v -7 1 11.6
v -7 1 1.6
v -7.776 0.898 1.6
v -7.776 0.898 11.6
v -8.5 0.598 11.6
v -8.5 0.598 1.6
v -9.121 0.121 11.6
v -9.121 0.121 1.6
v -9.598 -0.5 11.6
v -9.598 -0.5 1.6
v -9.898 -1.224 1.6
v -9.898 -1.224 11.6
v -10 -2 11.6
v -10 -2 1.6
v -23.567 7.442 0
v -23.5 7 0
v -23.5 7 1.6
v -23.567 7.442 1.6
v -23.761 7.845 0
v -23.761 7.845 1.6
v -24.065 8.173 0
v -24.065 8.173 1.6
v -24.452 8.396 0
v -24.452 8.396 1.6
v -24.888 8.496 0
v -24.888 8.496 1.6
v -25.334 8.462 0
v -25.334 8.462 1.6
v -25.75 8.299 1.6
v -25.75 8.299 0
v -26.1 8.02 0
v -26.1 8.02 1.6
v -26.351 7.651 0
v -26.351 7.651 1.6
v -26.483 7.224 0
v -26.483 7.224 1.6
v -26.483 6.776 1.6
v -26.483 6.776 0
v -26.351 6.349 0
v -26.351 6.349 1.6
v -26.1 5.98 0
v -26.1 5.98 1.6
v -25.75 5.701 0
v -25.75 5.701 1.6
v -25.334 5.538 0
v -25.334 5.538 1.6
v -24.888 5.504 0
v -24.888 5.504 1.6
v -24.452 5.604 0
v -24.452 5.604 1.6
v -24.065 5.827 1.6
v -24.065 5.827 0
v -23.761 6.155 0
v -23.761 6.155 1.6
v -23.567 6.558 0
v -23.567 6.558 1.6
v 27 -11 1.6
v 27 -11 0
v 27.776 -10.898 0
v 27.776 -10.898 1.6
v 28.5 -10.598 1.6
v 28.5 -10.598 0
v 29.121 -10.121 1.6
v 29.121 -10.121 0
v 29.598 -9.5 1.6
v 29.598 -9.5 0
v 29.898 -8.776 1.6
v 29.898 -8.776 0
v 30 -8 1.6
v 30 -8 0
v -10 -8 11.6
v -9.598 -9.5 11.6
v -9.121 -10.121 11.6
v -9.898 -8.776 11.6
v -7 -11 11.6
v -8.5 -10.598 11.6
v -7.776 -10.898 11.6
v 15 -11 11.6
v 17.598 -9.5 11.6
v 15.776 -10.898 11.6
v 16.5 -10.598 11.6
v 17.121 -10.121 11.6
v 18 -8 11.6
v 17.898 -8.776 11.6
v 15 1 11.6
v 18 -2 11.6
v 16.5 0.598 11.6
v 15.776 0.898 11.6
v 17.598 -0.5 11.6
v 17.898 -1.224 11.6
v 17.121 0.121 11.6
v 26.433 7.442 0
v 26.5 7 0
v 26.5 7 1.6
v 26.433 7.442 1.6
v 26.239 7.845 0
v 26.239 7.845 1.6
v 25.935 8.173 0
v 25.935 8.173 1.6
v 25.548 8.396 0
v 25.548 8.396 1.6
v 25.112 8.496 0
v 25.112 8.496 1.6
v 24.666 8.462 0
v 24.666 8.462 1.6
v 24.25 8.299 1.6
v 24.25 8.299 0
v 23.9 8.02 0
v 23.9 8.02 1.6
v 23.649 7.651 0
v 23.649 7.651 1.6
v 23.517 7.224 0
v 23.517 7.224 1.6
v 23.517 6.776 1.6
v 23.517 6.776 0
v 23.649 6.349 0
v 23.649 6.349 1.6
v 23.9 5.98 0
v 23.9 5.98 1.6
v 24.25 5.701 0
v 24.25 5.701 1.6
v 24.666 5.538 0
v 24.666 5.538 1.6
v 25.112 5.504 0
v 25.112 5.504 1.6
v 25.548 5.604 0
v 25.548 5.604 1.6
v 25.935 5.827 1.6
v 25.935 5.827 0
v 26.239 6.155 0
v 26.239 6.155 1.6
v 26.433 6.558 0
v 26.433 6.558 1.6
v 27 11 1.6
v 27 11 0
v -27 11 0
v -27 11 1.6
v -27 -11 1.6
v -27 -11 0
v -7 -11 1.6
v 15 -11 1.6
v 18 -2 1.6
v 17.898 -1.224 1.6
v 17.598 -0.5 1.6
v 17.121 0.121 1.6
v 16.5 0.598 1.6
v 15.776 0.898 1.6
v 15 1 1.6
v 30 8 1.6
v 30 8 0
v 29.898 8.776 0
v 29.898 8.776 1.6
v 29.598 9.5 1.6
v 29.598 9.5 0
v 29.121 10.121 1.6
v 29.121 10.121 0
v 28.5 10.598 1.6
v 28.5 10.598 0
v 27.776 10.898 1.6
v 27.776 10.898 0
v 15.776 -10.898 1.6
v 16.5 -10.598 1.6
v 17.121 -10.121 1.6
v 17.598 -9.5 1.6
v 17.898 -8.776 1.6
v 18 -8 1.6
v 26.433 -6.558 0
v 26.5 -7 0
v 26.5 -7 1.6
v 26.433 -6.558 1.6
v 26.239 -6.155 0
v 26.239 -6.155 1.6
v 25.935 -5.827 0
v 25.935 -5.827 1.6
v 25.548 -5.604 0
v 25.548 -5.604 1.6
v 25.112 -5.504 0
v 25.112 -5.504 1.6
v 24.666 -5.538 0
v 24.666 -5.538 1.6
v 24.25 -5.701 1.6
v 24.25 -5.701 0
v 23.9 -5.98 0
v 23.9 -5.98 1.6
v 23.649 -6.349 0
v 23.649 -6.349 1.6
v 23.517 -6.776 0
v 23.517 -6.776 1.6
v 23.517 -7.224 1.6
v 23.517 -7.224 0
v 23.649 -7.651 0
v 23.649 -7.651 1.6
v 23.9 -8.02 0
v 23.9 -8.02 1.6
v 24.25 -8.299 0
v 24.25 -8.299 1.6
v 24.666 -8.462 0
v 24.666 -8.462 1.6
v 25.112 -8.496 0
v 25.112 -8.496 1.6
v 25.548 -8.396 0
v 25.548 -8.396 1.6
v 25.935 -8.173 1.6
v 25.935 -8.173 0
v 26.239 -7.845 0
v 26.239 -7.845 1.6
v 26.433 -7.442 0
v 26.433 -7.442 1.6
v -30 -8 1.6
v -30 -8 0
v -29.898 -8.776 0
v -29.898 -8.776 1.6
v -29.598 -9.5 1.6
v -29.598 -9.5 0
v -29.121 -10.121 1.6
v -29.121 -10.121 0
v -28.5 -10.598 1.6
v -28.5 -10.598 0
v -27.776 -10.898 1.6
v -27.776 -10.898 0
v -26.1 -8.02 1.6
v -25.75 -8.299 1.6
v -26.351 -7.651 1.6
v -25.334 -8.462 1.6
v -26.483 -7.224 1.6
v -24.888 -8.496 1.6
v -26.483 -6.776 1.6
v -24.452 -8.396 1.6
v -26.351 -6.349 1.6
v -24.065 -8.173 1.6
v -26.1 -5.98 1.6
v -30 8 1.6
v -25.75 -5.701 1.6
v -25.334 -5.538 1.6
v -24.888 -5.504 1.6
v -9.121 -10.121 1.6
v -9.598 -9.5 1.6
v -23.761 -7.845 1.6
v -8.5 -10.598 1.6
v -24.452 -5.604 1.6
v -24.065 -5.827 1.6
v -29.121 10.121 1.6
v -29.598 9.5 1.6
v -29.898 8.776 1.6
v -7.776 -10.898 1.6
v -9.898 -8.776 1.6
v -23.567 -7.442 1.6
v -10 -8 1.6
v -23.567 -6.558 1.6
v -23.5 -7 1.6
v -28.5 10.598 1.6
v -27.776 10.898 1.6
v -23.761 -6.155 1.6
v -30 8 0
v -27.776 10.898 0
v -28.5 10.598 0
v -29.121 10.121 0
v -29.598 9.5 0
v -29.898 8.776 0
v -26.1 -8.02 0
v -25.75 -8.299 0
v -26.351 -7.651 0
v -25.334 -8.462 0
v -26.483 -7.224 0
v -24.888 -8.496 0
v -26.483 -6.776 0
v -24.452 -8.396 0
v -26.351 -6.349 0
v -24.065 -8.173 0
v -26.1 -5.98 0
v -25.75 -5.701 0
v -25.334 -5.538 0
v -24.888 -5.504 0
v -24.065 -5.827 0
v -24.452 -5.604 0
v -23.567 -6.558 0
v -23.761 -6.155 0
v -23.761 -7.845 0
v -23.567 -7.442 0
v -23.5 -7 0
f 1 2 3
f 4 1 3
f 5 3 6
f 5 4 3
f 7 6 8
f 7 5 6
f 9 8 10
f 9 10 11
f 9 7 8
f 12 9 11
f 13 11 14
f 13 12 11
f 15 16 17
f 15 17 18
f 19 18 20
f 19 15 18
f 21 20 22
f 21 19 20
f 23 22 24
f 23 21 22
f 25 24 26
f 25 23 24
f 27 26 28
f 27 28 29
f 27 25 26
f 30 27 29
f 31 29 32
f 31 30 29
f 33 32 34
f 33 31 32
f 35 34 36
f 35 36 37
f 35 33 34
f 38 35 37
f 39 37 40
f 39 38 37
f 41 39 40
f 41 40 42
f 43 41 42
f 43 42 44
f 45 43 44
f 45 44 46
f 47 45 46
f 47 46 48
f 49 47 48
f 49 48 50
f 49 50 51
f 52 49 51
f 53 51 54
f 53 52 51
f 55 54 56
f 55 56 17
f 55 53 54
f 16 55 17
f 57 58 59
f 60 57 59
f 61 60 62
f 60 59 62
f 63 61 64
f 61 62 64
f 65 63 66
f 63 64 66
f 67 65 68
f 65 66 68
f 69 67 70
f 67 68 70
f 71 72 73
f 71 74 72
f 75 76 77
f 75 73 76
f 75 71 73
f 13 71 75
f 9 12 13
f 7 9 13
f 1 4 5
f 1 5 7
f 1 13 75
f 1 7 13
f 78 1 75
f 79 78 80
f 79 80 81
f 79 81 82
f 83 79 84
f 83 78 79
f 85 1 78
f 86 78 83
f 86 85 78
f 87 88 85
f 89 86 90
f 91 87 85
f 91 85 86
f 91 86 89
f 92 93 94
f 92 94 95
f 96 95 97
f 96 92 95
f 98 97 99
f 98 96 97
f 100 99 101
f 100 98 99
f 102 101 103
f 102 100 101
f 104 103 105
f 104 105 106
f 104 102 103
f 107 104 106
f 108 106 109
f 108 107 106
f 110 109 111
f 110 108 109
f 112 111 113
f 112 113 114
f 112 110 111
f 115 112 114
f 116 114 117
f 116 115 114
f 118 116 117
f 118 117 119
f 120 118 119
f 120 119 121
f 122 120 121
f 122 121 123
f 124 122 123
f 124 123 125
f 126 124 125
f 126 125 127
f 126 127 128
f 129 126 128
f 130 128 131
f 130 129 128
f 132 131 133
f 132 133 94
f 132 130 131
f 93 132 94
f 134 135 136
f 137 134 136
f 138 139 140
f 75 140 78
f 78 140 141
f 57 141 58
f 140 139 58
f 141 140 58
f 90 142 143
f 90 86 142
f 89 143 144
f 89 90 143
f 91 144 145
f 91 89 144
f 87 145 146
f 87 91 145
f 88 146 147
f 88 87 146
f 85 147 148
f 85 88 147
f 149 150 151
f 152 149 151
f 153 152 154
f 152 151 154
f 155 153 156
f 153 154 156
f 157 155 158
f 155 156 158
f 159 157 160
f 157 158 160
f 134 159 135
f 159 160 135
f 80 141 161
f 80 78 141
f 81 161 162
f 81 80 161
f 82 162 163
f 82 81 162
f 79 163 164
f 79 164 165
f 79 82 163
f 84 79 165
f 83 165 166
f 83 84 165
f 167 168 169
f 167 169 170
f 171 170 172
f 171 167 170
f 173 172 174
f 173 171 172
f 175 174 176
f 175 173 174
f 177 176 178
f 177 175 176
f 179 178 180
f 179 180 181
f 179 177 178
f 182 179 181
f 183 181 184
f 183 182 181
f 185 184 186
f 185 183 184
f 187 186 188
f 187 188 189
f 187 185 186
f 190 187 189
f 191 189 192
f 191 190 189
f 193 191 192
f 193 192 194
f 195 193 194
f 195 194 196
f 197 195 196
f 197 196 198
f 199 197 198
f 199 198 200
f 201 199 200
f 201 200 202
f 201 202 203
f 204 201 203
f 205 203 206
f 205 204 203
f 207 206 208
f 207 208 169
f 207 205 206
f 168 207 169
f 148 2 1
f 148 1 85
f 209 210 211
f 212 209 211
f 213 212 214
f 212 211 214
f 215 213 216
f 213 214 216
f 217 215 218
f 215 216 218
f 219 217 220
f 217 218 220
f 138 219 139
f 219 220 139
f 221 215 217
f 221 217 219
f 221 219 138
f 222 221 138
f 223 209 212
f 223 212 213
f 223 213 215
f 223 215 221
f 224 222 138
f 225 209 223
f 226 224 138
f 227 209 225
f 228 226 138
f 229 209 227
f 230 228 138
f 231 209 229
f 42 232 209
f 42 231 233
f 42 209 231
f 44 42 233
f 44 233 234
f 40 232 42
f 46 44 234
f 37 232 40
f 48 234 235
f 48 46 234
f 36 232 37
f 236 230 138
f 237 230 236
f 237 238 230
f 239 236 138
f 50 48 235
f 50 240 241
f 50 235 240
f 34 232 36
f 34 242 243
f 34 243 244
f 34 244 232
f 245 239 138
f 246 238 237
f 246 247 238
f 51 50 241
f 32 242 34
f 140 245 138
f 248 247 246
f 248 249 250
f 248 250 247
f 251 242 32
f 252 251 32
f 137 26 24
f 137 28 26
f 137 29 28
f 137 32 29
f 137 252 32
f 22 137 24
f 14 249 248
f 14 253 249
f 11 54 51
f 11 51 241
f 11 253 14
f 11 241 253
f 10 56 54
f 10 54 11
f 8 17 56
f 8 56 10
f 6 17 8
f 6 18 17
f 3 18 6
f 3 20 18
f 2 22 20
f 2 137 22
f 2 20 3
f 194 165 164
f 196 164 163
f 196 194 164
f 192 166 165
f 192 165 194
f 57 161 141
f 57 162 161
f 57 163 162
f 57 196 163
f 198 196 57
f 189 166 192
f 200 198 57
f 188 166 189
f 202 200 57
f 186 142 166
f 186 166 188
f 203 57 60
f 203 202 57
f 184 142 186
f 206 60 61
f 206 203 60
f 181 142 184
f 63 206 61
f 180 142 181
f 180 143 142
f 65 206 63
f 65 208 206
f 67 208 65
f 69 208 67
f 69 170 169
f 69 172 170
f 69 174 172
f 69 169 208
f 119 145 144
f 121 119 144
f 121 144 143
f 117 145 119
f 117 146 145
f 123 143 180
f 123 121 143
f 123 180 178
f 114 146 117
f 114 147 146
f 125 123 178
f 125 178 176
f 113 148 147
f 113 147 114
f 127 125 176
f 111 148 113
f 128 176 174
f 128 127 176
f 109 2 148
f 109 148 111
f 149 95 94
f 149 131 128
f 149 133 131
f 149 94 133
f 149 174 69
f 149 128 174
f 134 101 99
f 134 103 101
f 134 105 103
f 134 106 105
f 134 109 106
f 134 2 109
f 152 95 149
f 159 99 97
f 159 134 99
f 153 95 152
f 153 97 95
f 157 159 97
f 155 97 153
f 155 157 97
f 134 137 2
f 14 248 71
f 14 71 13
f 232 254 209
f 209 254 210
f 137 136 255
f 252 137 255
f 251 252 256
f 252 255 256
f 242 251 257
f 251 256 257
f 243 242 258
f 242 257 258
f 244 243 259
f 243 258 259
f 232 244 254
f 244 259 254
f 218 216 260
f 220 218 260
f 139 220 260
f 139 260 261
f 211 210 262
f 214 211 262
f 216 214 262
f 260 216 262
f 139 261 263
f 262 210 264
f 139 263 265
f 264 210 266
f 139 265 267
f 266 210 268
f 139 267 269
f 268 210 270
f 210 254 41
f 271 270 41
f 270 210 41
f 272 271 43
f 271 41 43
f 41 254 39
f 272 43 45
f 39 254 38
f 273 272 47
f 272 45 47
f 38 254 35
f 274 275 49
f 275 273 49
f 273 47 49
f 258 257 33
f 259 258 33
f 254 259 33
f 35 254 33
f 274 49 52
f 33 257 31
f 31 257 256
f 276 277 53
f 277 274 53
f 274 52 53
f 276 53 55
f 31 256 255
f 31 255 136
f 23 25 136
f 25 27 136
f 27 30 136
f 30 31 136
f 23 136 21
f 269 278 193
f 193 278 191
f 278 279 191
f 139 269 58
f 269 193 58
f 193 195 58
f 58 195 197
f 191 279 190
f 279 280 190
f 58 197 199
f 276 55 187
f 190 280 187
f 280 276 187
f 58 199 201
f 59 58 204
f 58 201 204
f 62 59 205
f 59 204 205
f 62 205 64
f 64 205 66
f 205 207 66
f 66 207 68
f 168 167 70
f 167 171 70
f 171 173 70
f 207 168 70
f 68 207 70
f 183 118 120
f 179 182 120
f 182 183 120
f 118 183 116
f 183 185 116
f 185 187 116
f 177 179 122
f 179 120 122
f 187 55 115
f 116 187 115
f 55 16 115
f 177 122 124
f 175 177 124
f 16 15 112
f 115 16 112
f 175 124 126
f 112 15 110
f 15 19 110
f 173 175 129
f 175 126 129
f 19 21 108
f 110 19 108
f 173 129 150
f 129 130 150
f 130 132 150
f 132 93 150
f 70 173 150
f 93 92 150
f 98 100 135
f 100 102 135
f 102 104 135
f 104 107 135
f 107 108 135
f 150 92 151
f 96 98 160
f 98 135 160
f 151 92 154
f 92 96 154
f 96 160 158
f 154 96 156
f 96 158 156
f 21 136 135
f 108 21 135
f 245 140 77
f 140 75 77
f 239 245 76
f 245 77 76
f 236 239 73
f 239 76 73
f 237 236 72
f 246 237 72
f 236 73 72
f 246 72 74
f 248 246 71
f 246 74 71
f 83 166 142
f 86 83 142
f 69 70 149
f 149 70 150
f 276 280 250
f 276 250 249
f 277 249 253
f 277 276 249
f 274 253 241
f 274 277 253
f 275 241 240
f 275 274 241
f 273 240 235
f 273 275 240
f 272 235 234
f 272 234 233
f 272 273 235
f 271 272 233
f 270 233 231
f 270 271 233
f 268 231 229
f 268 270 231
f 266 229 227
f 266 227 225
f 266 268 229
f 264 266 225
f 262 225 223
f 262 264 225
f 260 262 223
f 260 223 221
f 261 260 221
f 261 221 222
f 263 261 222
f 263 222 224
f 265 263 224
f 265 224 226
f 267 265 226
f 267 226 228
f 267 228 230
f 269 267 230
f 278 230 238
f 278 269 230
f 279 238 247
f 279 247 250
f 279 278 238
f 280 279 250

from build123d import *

# Parameters (mm, degrees)
SKETCH_1_R      = 1.5
EXTRUDE_1_DEPTH = 1.6
SKETCH_2_W      = 28
SKETCH_2_H      = 12
EXTRUDE_2_DEPTH = 10
FILLET_1_R      = 3


with BuildPart() as part:
    # 草图1 → 凸台-拉伸1 (new body)
    with BuildSketch(Plane.XY):
        with BuildLine():
            Line((-30, 8), (-30, -8))
            ThreePointArc((-30, -8), (-29.121320344, -10.121320344), (-27, -11))
            Line((-27, -11), (27, -11))
            ThreePointArc((27, -11), (29.121320344, -10.121320344), (30, -8))
            Line((30, -8), (30, 8))
            ThreePointArc((30, 8), (29.121320344, 10.121320344), (27, 11))
            Line((27, 11), (-27, 11))
            ThreePointArc((-27, 11), (-29.121320344, 10.121320344), (-30, 8))
        make_face()
        with Locations((-25, 7)):
            Circle(SKETCH_1_R, mode=Mode.SUBTRACT)
        with Locations((25, 7)):
            Circle(SKETCH_1_R, mode=Mode.SUBTRACT)
        with Locations((25, -7)):
            Circle(SKETCH_1_R, mode=Mode.SUBTRACT)
        with Locations((-25, -7)):
            Circle(SKETCH_1_R, mode=Mode.SUBTRACT)
    extrude(amount=EXTRUDE_1_DEPTH)

    # 草图2 → 凸台-拉伸2 (add)
    with BuildSketch(Plane.XY.offset(1.6)):
        with Locations((4, -5)):
            Rectangle(SKETCH_2_W, SKETCH_2_H)
    extrude(amount=EXTRUDE_2_DEPTH)

    # 圆角1
    fillet_1_edges = [part.edges().sort_by_distance(p)[0] for p in [
        (-10, 1, 6.6),
        (-10, -11, 6.6),
        (18, -11, 6.6),
        (18, 1, 6.6),
    ]]
    fillet(fillet_1_edges, radius=FILLET_1_R)


solid = part.part
